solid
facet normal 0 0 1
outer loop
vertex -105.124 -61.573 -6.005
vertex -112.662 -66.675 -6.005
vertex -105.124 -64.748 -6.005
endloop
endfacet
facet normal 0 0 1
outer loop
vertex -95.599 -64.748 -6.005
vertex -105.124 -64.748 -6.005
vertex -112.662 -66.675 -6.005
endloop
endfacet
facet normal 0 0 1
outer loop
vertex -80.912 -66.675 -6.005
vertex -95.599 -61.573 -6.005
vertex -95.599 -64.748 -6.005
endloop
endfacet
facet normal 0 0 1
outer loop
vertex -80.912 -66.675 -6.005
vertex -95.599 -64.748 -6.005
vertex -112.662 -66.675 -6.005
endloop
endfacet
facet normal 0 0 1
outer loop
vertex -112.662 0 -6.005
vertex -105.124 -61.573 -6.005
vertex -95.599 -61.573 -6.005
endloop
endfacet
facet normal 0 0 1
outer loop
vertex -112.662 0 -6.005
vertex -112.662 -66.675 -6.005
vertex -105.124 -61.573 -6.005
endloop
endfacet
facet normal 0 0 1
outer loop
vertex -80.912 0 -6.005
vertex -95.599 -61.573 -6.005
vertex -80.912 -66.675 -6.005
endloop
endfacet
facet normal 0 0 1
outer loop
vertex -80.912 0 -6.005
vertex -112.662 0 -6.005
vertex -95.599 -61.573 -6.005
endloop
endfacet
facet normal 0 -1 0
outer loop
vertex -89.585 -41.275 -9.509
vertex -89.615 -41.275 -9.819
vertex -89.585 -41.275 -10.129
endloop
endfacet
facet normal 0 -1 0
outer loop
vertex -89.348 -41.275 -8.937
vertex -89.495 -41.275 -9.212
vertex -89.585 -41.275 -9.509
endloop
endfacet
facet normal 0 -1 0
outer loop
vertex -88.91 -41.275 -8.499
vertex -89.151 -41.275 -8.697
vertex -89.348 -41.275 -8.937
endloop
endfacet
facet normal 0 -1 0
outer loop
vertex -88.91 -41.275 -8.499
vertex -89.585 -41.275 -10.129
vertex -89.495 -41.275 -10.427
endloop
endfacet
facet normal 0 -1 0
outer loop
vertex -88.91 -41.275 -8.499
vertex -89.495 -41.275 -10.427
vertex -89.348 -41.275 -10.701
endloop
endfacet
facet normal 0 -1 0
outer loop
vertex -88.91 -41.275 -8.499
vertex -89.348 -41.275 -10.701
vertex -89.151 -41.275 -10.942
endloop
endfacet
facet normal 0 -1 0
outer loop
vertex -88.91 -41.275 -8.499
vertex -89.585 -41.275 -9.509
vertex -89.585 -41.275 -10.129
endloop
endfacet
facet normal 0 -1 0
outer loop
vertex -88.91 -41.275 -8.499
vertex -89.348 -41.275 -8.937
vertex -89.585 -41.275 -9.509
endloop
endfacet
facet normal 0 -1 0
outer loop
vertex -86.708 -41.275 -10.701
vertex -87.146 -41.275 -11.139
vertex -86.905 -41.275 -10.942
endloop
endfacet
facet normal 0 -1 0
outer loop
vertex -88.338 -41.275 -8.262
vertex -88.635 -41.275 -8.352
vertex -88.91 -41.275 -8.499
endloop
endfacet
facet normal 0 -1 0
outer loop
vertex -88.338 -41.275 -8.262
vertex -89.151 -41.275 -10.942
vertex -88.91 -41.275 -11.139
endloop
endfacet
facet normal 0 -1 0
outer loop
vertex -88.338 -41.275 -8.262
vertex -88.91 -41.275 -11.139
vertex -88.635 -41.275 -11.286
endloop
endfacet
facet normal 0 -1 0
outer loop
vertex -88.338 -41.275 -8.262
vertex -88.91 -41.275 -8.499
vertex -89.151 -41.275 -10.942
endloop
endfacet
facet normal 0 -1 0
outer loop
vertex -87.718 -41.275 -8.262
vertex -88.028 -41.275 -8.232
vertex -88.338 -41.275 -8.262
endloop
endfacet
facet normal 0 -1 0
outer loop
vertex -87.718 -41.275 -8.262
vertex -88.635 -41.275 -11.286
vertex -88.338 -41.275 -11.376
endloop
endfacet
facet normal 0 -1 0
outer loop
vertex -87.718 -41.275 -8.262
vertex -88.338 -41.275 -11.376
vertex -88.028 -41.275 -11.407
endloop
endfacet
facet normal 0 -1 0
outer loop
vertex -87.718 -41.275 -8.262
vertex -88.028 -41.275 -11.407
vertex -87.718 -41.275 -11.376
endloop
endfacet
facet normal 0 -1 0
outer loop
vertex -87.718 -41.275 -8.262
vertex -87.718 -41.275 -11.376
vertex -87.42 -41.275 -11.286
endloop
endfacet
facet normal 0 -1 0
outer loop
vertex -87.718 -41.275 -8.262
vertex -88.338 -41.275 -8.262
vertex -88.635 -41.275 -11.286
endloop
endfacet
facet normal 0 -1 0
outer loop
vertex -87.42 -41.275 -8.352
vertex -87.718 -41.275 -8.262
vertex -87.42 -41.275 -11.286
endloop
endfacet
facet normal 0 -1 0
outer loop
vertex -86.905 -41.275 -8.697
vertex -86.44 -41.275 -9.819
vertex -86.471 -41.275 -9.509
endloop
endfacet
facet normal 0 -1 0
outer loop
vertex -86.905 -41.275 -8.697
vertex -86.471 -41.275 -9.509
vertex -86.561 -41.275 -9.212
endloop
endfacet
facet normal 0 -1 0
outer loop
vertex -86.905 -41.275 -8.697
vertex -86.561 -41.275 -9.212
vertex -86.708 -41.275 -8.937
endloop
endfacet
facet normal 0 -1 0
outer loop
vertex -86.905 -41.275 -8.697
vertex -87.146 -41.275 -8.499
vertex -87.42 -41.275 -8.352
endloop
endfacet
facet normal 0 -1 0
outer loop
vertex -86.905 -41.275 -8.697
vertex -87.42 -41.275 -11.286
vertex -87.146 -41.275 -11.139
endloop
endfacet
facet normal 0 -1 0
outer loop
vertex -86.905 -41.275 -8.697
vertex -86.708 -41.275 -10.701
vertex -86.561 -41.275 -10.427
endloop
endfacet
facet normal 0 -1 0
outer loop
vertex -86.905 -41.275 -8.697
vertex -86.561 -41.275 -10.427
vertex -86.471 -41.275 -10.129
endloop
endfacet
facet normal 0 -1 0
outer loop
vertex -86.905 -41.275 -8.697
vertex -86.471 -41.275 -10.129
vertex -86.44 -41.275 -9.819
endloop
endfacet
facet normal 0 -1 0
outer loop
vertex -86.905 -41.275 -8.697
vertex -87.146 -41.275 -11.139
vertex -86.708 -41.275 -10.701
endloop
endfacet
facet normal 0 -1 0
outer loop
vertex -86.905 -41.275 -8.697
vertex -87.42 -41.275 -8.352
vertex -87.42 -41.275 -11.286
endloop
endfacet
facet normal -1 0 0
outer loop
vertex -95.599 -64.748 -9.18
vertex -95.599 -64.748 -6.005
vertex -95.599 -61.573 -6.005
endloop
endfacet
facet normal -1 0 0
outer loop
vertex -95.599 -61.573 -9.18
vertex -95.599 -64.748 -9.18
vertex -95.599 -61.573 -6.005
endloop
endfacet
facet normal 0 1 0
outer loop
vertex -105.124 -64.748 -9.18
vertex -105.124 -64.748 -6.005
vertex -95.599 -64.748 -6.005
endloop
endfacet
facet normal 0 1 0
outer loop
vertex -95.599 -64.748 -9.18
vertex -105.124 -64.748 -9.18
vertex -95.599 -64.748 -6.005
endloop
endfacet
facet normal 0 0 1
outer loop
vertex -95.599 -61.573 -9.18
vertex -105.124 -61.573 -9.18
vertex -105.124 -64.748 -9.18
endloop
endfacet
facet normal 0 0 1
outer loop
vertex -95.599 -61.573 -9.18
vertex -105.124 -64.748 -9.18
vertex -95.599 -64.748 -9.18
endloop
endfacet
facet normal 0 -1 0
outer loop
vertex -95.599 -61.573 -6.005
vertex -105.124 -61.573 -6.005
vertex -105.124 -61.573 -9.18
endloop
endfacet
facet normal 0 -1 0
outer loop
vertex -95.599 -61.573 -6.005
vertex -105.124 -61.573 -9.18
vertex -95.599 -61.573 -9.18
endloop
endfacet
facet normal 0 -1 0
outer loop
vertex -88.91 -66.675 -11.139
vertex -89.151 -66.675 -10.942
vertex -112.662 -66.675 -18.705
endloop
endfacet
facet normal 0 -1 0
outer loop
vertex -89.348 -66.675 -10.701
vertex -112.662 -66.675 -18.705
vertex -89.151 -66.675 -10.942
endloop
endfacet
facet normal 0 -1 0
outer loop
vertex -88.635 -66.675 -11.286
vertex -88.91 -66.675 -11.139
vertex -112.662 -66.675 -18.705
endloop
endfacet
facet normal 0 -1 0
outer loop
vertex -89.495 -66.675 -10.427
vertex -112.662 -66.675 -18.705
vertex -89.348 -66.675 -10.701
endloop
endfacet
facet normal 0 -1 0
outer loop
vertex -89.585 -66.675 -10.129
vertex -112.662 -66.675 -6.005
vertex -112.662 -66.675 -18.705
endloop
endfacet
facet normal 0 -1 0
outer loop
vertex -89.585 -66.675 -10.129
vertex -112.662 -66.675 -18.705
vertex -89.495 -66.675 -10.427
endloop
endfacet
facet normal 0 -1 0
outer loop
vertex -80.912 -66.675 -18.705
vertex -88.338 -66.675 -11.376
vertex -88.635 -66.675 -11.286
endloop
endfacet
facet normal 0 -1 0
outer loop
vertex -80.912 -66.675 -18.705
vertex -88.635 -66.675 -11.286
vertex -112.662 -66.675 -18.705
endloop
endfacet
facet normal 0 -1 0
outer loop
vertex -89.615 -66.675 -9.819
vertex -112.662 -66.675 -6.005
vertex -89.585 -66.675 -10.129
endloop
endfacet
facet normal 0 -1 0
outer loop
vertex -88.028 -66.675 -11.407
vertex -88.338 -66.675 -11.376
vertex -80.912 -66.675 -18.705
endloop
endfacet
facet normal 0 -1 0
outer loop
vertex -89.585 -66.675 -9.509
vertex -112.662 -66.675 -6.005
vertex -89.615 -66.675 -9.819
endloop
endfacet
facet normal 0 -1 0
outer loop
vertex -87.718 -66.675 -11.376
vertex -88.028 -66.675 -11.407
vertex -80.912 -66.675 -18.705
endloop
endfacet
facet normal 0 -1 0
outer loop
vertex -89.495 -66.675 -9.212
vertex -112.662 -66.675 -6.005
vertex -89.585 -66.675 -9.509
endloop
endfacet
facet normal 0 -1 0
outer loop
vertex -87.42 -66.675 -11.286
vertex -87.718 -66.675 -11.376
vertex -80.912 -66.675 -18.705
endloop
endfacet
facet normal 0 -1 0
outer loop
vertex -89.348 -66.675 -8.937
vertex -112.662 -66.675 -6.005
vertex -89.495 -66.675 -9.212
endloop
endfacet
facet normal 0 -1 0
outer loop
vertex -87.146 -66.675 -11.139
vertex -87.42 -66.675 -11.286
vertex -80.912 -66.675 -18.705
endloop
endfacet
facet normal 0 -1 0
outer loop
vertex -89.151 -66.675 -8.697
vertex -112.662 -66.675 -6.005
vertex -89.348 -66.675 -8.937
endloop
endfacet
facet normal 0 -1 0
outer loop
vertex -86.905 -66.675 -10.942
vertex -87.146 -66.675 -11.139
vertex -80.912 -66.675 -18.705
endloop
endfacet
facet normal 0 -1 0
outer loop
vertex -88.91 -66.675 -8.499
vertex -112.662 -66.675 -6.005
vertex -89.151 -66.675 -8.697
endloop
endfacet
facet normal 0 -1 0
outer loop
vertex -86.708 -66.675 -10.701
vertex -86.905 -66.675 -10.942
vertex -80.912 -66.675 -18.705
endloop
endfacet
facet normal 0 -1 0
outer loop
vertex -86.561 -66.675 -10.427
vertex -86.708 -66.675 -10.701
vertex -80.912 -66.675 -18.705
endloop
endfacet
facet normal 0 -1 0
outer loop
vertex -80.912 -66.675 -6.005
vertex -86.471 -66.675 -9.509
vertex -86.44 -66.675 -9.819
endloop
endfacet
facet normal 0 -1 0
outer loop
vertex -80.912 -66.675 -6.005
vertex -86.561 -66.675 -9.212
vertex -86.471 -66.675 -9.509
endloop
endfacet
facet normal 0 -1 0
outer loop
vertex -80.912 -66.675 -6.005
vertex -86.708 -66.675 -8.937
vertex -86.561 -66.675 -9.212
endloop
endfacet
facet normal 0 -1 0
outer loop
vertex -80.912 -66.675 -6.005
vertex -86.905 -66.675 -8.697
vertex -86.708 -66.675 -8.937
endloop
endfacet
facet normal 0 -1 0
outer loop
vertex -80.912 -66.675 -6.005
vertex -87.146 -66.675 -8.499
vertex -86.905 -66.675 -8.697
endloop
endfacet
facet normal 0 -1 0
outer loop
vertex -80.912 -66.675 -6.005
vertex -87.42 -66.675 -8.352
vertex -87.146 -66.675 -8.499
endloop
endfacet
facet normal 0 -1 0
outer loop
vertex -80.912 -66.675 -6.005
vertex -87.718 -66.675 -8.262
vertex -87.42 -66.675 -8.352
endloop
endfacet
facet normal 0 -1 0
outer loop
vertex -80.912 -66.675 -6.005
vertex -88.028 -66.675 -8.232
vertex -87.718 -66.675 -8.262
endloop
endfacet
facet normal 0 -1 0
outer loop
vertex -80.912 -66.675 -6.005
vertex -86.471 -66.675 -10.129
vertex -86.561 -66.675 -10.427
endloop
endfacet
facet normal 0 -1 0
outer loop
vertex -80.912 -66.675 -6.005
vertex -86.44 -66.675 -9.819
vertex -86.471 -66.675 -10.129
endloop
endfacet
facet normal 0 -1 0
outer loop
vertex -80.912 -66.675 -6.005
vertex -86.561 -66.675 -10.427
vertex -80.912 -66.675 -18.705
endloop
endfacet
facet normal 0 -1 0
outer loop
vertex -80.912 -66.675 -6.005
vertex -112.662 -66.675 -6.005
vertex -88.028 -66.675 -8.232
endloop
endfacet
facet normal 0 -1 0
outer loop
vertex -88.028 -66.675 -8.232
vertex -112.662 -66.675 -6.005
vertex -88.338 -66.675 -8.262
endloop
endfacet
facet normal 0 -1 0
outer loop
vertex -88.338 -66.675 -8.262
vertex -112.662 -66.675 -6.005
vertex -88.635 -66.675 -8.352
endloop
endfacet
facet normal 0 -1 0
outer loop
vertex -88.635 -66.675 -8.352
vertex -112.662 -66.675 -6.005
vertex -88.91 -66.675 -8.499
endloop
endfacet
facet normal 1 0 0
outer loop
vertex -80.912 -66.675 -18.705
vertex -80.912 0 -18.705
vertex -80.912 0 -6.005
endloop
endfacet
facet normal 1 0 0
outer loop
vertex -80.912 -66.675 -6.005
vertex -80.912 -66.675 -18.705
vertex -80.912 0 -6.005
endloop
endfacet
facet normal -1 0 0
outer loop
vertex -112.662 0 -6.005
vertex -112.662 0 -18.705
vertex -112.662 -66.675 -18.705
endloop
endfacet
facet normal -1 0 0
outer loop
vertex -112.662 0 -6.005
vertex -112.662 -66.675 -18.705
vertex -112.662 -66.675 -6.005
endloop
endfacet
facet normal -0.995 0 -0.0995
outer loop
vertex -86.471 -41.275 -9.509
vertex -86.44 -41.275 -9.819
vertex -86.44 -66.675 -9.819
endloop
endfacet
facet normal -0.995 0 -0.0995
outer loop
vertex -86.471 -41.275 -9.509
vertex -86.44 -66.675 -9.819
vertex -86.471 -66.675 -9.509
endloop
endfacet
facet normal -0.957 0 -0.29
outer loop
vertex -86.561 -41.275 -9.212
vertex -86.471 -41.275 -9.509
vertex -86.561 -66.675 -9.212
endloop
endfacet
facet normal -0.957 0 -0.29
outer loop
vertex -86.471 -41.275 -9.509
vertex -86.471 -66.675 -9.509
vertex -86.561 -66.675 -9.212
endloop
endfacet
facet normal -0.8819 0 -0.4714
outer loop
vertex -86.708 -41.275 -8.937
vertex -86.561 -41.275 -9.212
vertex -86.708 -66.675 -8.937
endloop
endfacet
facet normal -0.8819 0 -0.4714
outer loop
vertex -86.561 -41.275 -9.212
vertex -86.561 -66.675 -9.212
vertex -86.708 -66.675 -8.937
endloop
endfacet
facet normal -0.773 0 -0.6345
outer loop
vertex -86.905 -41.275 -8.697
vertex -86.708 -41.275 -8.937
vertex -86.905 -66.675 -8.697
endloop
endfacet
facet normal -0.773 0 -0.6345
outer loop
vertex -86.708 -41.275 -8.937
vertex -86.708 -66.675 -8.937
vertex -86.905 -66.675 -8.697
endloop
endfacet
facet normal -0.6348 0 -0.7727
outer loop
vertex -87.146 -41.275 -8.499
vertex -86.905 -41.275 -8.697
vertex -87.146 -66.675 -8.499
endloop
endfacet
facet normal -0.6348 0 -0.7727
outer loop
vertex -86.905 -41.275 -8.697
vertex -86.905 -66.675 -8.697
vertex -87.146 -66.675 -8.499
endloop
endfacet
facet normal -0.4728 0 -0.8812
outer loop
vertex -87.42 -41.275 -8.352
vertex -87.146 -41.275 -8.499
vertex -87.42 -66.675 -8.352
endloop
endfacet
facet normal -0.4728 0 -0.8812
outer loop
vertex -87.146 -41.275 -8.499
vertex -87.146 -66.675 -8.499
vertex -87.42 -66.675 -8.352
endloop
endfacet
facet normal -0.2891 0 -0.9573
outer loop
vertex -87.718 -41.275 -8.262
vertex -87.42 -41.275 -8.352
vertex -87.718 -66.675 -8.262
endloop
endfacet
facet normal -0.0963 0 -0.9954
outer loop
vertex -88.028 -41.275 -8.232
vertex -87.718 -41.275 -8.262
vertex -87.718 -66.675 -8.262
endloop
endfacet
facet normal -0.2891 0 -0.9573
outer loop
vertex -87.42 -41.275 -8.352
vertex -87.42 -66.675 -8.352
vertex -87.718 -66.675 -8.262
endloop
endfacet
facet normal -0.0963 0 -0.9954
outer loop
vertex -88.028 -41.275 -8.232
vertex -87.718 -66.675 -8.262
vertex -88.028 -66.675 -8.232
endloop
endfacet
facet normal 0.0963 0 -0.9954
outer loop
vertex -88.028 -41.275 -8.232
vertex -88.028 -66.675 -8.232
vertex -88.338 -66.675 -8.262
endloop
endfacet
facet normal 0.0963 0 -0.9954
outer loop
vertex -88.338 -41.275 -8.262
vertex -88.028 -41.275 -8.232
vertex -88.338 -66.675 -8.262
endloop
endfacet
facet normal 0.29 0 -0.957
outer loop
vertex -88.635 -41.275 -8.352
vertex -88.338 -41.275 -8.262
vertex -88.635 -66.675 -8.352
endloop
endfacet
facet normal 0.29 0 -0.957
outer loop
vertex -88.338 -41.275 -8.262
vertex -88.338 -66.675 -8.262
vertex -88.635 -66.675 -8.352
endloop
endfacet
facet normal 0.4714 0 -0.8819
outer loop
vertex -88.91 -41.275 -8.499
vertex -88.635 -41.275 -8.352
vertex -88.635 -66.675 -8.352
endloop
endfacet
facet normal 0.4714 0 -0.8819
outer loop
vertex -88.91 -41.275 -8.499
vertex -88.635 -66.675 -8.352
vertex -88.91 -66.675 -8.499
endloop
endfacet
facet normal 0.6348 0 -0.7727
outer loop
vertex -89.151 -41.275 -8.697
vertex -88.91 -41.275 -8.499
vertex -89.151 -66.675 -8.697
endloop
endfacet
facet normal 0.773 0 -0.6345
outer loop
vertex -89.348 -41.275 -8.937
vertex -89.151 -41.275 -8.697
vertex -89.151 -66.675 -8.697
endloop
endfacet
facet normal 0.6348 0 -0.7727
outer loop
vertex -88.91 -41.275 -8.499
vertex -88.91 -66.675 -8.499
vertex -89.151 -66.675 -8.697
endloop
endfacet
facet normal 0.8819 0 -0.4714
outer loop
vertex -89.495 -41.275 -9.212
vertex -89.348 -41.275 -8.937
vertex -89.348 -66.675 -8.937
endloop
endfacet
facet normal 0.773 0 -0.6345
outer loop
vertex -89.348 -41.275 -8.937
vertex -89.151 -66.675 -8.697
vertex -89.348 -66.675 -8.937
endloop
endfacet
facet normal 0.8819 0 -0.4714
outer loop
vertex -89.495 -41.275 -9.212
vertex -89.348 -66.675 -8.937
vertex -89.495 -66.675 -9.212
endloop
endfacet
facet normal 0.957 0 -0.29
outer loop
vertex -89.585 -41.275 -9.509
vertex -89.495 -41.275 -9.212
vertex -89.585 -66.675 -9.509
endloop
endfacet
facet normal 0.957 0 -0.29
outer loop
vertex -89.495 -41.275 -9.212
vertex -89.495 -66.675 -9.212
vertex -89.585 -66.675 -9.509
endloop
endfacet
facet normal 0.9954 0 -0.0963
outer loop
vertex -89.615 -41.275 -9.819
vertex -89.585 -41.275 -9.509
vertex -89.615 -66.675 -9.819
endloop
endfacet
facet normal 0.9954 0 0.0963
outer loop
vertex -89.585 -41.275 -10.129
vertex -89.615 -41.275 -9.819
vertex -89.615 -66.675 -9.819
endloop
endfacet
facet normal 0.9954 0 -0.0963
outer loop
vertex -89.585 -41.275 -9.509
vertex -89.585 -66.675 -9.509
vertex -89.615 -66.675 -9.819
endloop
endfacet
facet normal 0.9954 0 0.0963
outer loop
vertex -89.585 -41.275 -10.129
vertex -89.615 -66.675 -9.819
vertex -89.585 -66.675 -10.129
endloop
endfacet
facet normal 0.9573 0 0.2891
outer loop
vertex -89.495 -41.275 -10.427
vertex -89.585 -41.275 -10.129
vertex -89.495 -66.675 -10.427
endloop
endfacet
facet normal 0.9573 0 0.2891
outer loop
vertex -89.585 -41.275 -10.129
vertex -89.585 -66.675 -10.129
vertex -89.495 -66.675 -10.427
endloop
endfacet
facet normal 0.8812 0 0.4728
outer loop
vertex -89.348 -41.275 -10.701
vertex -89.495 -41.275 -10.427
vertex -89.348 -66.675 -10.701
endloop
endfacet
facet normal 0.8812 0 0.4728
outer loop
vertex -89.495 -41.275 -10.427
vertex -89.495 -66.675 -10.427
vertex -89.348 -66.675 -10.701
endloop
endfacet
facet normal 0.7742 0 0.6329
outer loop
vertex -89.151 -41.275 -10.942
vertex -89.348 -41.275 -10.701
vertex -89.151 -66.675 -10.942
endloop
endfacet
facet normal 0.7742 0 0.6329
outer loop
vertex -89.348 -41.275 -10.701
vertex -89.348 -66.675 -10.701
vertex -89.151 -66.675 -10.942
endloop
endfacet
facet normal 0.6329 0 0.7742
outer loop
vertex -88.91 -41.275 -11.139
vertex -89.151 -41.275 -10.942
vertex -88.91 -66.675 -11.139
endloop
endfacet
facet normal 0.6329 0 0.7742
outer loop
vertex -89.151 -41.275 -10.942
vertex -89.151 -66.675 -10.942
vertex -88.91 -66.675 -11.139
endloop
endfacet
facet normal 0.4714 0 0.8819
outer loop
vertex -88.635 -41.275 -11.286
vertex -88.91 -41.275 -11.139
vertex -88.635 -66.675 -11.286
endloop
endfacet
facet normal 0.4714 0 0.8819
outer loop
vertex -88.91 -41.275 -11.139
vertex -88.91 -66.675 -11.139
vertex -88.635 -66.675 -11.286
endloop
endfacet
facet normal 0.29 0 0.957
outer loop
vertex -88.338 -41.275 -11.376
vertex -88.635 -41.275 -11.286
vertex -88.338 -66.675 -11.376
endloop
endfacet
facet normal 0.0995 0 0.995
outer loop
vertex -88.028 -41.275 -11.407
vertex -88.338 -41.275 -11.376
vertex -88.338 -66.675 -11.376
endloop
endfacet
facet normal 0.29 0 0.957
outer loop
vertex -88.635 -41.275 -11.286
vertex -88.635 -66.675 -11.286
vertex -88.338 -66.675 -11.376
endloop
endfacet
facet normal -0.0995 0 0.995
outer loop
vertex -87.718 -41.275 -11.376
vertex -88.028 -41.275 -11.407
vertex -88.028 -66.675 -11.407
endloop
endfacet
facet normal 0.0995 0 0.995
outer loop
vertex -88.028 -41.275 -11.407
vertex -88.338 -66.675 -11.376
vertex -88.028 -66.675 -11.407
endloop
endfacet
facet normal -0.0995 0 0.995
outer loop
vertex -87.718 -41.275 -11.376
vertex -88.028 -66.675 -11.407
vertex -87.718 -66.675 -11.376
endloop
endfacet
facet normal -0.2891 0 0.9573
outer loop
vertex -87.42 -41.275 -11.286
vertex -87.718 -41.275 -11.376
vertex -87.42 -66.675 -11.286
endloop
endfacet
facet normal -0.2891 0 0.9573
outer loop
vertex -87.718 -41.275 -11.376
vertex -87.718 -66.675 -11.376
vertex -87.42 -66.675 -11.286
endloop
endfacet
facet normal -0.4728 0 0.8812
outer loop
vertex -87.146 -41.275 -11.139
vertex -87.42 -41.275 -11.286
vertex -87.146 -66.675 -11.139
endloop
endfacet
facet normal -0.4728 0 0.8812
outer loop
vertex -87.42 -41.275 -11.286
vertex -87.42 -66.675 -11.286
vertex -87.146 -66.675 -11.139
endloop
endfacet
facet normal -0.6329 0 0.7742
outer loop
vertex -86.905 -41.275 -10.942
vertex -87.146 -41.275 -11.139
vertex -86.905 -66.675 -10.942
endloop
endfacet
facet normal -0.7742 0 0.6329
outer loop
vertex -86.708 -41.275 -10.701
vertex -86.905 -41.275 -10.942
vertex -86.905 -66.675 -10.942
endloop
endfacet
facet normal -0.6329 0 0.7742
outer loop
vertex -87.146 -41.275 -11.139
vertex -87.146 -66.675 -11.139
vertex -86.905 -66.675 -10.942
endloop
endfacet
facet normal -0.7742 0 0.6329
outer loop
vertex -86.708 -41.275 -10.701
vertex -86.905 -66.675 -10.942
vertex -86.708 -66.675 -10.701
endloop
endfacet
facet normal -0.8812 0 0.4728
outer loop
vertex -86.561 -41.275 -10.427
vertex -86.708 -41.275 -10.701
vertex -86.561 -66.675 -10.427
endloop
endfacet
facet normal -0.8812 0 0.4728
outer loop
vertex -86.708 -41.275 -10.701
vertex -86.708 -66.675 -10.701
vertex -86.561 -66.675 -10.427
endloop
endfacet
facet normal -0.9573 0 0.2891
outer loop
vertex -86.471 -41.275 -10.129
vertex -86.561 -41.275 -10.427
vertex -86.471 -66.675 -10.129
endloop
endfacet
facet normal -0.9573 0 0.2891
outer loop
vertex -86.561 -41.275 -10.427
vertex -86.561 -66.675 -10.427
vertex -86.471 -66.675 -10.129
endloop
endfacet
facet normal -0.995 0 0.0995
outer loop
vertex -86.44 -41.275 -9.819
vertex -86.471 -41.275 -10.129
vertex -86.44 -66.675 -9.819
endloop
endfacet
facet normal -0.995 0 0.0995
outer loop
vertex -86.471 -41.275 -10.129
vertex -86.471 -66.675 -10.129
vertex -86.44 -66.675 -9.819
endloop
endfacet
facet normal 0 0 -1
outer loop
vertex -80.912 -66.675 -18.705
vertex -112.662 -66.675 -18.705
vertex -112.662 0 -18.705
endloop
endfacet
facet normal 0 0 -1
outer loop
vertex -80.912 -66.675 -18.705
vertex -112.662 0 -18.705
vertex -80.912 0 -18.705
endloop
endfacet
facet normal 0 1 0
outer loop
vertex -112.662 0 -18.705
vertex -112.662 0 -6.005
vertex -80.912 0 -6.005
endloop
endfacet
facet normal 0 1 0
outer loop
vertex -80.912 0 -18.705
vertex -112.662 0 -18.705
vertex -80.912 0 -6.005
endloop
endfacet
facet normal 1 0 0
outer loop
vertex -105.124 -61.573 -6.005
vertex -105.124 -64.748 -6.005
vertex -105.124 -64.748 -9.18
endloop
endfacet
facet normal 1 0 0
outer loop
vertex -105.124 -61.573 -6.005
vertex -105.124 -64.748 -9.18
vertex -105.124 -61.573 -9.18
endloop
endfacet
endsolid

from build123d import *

# Parameters (mm, degrees)
F0_W     = 31.75
F0_H     = 12.7
F1_DEPTH = 66.675
F2_R     = 1.5875
F3_DEPTH = 25.4
F4_W     = 9.525
F4_H     = 3.175
F5_DEPTH = 3.175


with BuildPart() as f1:
    # F0 (on Front) → F1 (new body)
    with BuildSketch(Plane.XZ):
        with Locations((-96.787434, -12.355283)):
            Rectangle(F0_W, F0_H)
    extrude(amount=F1_DEPTH)

    # F2 (on face) → F3 (cut)
    with BuildSketch(Plane.XZ.offset(66.675)):
        with Locations((-88.027969, -9.819109)):
            Circle(F2_R)
    extrude(amount=-F3_DEPTH, mode=Mode.SUBTRACT)

    # F4 (on face) → F5 (cut)
    with BuildSketch(Plane.XY.offset(-6.005283)):
        with Locations((-100.361299, -63.160878)):
            Rectangle(F4_W, F4_H)
    extrude(amount=-F5_DEPTH, mode=Mode.SUBTRACT)


solid = f1.part
